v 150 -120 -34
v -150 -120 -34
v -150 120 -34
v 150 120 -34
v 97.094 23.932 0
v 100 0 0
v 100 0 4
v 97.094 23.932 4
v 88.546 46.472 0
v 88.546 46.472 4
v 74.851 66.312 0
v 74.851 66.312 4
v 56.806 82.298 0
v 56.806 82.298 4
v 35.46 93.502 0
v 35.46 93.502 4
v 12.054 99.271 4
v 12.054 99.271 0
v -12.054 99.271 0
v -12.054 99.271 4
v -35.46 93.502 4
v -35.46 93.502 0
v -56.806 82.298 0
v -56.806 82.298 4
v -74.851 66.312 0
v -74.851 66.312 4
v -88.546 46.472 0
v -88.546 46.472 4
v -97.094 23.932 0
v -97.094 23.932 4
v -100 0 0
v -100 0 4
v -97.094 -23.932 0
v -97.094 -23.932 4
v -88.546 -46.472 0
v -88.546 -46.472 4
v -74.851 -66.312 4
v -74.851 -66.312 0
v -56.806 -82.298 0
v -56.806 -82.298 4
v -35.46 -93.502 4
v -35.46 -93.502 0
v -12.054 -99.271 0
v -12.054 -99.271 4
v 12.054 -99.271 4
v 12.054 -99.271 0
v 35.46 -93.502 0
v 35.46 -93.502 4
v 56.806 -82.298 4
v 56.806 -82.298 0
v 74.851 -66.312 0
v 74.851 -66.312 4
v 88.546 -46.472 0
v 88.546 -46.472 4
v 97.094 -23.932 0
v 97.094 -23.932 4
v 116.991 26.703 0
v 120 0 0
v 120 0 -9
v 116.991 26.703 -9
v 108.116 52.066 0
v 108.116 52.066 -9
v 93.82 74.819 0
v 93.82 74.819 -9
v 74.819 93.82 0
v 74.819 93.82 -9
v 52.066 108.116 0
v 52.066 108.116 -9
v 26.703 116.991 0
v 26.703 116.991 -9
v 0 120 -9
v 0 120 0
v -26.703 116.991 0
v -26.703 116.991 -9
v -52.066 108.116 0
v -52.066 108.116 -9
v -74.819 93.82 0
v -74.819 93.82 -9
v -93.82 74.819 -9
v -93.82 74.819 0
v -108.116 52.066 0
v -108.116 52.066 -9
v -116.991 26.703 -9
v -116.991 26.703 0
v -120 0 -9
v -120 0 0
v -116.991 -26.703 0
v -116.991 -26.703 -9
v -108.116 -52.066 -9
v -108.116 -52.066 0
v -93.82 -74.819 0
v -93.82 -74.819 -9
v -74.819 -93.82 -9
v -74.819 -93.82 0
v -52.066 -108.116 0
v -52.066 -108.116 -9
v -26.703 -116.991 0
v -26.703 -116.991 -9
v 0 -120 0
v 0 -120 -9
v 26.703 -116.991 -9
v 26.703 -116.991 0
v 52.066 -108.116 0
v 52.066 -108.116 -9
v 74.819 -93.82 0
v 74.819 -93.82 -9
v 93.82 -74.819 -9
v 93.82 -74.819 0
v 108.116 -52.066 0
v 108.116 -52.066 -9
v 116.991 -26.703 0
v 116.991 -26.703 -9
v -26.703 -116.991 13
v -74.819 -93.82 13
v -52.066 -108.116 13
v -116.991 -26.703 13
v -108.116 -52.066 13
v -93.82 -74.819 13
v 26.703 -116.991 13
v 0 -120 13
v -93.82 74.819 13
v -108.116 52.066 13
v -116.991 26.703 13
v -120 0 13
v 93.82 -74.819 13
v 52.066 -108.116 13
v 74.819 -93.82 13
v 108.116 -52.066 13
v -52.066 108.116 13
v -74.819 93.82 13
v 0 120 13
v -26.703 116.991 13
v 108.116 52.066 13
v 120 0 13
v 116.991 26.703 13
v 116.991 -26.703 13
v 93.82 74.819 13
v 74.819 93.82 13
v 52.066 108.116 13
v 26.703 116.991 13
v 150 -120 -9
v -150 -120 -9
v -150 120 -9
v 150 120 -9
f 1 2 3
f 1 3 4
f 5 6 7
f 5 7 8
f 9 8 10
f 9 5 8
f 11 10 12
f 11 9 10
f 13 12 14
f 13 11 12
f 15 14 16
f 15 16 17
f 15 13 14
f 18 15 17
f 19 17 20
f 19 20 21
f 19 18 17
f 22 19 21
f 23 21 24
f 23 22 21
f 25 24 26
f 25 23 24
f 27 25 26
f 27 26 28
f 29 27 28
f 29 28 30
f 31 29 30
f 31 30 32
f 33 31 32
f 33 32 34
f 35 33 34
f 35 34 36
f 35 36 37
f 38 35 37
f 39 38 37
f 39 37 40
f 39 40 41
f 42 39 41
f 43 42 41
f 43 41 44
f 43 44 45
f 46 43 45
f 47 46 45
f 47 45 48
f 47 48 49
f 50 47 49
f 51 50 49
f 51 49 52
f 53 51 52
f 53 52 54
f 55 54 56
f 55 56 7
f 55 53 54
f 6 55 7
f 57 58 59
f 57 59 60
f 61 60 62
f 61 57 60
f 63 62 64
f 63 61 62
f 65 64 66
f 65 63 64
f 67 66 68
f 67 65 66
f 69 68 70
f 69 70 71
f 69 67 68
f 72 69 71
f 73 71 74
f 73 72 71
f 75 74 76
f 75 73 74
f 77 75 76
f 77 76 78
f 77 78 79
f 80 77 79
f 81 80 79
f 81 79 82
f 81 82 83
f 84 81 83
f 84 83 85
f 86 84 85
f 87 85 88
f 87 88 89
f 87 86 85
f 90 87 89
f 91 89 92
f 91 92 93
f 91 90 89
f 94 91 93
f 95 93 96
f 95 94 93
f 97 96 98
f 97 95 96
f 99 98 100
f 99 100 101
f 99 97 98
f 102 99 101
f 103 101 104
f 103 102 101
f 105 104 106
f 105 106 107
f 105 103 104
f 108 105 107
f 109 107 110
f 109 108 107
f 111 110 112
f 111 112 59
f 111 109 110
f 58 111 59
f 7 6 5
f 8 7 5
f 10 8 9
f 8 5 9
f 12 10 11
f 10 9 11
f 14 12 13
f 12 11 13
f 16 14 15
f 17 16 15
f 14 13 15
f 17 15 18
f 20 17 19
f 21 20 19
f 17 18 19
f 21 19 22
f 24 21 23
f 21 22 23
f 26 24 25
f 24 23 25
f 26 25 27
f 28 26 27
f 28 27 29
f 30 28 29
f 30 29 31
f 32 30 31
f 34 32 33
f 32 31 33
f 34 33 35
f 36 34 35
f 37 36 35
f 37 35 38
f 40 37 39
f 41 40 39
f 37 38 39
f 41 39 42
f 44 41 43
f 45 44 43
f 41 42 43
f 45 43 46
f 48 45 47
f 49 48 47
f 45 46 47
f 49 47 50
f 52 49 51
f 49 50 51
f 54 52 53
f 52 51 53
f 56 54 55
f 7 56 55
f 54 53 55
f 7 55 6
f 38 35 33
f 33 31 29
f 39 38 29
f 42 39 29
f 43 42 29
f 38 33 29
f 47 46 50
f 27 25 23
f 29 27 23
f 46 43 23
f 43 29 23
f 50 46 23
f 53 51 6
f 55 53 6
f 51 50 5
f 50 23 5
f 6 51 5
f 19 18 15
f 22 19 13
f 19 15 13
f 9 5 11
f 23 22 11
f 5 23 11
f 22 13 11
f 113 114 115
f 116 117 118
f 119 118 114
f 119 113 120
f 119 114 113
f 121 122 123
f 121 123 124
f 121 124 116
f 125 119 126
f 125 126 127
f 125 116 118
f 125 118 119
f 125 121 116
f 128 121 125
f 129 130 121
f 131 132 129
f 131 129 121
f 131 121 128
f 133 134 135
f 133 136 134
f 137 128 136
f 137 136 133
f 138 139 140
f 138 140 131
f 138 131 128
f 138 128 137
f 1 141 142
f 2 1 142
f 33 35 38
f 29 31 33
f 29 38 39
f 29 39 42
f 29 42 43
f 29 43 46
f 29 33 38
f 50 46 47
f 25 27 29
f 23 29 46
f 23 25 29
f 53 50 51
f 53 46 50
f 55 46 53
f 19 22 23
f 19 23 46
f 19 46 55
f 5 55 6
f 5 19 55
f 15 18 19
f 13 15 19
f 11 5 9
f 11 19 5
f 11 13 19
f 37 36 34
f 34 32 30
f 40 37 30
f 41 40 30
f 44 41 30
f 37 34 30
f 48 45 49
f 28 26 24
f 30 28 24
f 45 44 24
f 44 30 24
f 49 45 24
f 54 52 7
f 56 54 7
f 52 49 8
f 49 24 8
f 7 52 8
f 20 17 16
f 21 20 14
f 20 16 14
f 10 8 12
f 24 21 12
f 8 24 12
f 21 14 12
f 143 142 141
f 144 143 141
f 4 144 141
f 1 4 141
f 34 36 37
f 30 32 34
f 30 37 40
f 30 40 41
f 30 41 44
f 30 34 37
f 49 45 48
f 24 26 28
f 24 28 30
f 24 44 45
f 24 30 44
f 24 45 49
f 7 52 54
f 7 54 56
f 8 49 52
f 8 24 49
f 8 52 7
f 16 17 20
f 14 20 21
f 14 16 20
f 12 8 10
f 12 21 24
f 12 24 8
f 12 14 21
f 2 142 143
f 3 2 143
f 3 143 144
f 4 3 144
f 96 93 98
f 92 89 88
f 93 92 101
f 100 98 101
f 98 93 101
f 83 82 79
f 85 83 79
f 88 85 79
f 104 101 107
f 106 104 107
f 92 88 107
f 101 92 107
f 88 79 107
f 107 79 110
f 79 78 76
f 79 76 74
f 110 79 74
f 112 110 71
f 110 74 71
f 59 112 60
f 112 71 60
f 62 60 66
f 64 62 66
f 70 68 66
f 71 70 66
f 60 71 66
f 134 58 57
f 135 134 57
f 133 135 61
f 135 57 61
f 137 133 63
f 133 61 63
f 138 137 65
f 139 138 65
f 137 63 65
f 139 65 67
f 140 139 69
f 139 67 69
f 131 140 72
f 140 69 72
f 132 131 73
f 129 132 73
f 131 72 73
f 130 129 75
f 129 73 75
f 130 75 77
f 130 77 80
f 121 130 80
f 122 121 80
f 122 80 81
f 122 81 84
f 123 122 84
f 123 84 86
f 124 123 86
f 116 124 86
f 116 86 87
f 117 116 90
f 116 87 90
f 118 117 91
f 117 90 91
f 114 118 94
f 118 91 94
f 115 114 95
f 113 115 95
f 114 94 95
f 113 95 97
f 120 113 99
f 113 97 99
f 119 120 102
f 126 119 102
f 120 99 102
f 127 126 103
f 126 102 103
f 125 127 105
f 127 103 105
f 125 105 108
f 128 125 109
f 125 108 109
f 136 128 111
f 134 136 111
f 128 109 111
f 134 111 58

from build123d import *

# Parameters (mm, degrees)
F0_R     = 120
F0_R_2   = 100
F1_DEPTH = 9
F2_DEPTH = 4
F3_DEPTH = 13
F4_DEPTH = 9
F6_DEPTH = 25


with BuildPart() as f1:
    # F0 (on Top) → F1 (new body)
    with BuildSketch(Plane.XY):
        Circle(F0_R)
        Circle(F0_R_2, mode=Mode.SUBTRACT)
        Circle(F0_R_2)
    extrude(amount=-F1_DEPTH)

    # F0 (on Top) → F3 (join)
    with BuildSketch(Plane.XY):
        Circle(F0_R)
        Circle(F0_R_2, mode=Mode.SUBTRACT)
    extrude(amount=F3_DEPTH)



with BuildPart() as f2:
    # F0 (on Top) → F2 (new body)
    with BuildSketch(Plane.XY):
        Circle(F0_R_2)
    extrude(amount=F2_DEPTH)


with BuildPart() as f1_1:
    add(f1.part)
    # F4 (add): a face of the model
    f4_faces = [f2.part.faces().sort_by_distance(p)[0] for p in [
        (0, 0, 4),
    ]]
    extrude(f4_faces, amount=F4_DEPTH)


with BuildPart() as f6:
    # F5 (on face) → F6 (new body)
    with BuildSketch(Plane(origin=(0, 0, -9), x_dir=(1, 0, 0), z_dir=(0, 0, -1))):
        with BuildLine():
            Line((150, -120), (150, 120))
            Line((150, 120), (0, 120))
            ThreePointArc((0, 120), (84.8528137424, 84.8528137424), (120, 0))
            ThreePointArc((120, 0), (84.8528137424, -84.8528137424), (0, -120))
            Line((0, -120), (150, -120))
        make_face()
        with BuildLine():
            ThreePointArc((0, -120), (-120, 0), (0, 120))
            Line((0, 120), (-150, 120))
            Line((-150, 120), (-150, -120))
            Line((-150, -120), (0, -120))
        make_face()
        with BuildLine():
            ThreePointArc((120, 0), (84.8528137424, 84.8528137424), (0, 120))
            ThreePointArc((0, 120), (-120, 0), (0, -120))
            ThreePointArc((0, -120), (84.8528137424, -84.8528137424), (120, 0))
        make_face()
    extrude(amount=F6_DEPTH)


solid = Compound([f2.part, f1_1.part, f6.part])
